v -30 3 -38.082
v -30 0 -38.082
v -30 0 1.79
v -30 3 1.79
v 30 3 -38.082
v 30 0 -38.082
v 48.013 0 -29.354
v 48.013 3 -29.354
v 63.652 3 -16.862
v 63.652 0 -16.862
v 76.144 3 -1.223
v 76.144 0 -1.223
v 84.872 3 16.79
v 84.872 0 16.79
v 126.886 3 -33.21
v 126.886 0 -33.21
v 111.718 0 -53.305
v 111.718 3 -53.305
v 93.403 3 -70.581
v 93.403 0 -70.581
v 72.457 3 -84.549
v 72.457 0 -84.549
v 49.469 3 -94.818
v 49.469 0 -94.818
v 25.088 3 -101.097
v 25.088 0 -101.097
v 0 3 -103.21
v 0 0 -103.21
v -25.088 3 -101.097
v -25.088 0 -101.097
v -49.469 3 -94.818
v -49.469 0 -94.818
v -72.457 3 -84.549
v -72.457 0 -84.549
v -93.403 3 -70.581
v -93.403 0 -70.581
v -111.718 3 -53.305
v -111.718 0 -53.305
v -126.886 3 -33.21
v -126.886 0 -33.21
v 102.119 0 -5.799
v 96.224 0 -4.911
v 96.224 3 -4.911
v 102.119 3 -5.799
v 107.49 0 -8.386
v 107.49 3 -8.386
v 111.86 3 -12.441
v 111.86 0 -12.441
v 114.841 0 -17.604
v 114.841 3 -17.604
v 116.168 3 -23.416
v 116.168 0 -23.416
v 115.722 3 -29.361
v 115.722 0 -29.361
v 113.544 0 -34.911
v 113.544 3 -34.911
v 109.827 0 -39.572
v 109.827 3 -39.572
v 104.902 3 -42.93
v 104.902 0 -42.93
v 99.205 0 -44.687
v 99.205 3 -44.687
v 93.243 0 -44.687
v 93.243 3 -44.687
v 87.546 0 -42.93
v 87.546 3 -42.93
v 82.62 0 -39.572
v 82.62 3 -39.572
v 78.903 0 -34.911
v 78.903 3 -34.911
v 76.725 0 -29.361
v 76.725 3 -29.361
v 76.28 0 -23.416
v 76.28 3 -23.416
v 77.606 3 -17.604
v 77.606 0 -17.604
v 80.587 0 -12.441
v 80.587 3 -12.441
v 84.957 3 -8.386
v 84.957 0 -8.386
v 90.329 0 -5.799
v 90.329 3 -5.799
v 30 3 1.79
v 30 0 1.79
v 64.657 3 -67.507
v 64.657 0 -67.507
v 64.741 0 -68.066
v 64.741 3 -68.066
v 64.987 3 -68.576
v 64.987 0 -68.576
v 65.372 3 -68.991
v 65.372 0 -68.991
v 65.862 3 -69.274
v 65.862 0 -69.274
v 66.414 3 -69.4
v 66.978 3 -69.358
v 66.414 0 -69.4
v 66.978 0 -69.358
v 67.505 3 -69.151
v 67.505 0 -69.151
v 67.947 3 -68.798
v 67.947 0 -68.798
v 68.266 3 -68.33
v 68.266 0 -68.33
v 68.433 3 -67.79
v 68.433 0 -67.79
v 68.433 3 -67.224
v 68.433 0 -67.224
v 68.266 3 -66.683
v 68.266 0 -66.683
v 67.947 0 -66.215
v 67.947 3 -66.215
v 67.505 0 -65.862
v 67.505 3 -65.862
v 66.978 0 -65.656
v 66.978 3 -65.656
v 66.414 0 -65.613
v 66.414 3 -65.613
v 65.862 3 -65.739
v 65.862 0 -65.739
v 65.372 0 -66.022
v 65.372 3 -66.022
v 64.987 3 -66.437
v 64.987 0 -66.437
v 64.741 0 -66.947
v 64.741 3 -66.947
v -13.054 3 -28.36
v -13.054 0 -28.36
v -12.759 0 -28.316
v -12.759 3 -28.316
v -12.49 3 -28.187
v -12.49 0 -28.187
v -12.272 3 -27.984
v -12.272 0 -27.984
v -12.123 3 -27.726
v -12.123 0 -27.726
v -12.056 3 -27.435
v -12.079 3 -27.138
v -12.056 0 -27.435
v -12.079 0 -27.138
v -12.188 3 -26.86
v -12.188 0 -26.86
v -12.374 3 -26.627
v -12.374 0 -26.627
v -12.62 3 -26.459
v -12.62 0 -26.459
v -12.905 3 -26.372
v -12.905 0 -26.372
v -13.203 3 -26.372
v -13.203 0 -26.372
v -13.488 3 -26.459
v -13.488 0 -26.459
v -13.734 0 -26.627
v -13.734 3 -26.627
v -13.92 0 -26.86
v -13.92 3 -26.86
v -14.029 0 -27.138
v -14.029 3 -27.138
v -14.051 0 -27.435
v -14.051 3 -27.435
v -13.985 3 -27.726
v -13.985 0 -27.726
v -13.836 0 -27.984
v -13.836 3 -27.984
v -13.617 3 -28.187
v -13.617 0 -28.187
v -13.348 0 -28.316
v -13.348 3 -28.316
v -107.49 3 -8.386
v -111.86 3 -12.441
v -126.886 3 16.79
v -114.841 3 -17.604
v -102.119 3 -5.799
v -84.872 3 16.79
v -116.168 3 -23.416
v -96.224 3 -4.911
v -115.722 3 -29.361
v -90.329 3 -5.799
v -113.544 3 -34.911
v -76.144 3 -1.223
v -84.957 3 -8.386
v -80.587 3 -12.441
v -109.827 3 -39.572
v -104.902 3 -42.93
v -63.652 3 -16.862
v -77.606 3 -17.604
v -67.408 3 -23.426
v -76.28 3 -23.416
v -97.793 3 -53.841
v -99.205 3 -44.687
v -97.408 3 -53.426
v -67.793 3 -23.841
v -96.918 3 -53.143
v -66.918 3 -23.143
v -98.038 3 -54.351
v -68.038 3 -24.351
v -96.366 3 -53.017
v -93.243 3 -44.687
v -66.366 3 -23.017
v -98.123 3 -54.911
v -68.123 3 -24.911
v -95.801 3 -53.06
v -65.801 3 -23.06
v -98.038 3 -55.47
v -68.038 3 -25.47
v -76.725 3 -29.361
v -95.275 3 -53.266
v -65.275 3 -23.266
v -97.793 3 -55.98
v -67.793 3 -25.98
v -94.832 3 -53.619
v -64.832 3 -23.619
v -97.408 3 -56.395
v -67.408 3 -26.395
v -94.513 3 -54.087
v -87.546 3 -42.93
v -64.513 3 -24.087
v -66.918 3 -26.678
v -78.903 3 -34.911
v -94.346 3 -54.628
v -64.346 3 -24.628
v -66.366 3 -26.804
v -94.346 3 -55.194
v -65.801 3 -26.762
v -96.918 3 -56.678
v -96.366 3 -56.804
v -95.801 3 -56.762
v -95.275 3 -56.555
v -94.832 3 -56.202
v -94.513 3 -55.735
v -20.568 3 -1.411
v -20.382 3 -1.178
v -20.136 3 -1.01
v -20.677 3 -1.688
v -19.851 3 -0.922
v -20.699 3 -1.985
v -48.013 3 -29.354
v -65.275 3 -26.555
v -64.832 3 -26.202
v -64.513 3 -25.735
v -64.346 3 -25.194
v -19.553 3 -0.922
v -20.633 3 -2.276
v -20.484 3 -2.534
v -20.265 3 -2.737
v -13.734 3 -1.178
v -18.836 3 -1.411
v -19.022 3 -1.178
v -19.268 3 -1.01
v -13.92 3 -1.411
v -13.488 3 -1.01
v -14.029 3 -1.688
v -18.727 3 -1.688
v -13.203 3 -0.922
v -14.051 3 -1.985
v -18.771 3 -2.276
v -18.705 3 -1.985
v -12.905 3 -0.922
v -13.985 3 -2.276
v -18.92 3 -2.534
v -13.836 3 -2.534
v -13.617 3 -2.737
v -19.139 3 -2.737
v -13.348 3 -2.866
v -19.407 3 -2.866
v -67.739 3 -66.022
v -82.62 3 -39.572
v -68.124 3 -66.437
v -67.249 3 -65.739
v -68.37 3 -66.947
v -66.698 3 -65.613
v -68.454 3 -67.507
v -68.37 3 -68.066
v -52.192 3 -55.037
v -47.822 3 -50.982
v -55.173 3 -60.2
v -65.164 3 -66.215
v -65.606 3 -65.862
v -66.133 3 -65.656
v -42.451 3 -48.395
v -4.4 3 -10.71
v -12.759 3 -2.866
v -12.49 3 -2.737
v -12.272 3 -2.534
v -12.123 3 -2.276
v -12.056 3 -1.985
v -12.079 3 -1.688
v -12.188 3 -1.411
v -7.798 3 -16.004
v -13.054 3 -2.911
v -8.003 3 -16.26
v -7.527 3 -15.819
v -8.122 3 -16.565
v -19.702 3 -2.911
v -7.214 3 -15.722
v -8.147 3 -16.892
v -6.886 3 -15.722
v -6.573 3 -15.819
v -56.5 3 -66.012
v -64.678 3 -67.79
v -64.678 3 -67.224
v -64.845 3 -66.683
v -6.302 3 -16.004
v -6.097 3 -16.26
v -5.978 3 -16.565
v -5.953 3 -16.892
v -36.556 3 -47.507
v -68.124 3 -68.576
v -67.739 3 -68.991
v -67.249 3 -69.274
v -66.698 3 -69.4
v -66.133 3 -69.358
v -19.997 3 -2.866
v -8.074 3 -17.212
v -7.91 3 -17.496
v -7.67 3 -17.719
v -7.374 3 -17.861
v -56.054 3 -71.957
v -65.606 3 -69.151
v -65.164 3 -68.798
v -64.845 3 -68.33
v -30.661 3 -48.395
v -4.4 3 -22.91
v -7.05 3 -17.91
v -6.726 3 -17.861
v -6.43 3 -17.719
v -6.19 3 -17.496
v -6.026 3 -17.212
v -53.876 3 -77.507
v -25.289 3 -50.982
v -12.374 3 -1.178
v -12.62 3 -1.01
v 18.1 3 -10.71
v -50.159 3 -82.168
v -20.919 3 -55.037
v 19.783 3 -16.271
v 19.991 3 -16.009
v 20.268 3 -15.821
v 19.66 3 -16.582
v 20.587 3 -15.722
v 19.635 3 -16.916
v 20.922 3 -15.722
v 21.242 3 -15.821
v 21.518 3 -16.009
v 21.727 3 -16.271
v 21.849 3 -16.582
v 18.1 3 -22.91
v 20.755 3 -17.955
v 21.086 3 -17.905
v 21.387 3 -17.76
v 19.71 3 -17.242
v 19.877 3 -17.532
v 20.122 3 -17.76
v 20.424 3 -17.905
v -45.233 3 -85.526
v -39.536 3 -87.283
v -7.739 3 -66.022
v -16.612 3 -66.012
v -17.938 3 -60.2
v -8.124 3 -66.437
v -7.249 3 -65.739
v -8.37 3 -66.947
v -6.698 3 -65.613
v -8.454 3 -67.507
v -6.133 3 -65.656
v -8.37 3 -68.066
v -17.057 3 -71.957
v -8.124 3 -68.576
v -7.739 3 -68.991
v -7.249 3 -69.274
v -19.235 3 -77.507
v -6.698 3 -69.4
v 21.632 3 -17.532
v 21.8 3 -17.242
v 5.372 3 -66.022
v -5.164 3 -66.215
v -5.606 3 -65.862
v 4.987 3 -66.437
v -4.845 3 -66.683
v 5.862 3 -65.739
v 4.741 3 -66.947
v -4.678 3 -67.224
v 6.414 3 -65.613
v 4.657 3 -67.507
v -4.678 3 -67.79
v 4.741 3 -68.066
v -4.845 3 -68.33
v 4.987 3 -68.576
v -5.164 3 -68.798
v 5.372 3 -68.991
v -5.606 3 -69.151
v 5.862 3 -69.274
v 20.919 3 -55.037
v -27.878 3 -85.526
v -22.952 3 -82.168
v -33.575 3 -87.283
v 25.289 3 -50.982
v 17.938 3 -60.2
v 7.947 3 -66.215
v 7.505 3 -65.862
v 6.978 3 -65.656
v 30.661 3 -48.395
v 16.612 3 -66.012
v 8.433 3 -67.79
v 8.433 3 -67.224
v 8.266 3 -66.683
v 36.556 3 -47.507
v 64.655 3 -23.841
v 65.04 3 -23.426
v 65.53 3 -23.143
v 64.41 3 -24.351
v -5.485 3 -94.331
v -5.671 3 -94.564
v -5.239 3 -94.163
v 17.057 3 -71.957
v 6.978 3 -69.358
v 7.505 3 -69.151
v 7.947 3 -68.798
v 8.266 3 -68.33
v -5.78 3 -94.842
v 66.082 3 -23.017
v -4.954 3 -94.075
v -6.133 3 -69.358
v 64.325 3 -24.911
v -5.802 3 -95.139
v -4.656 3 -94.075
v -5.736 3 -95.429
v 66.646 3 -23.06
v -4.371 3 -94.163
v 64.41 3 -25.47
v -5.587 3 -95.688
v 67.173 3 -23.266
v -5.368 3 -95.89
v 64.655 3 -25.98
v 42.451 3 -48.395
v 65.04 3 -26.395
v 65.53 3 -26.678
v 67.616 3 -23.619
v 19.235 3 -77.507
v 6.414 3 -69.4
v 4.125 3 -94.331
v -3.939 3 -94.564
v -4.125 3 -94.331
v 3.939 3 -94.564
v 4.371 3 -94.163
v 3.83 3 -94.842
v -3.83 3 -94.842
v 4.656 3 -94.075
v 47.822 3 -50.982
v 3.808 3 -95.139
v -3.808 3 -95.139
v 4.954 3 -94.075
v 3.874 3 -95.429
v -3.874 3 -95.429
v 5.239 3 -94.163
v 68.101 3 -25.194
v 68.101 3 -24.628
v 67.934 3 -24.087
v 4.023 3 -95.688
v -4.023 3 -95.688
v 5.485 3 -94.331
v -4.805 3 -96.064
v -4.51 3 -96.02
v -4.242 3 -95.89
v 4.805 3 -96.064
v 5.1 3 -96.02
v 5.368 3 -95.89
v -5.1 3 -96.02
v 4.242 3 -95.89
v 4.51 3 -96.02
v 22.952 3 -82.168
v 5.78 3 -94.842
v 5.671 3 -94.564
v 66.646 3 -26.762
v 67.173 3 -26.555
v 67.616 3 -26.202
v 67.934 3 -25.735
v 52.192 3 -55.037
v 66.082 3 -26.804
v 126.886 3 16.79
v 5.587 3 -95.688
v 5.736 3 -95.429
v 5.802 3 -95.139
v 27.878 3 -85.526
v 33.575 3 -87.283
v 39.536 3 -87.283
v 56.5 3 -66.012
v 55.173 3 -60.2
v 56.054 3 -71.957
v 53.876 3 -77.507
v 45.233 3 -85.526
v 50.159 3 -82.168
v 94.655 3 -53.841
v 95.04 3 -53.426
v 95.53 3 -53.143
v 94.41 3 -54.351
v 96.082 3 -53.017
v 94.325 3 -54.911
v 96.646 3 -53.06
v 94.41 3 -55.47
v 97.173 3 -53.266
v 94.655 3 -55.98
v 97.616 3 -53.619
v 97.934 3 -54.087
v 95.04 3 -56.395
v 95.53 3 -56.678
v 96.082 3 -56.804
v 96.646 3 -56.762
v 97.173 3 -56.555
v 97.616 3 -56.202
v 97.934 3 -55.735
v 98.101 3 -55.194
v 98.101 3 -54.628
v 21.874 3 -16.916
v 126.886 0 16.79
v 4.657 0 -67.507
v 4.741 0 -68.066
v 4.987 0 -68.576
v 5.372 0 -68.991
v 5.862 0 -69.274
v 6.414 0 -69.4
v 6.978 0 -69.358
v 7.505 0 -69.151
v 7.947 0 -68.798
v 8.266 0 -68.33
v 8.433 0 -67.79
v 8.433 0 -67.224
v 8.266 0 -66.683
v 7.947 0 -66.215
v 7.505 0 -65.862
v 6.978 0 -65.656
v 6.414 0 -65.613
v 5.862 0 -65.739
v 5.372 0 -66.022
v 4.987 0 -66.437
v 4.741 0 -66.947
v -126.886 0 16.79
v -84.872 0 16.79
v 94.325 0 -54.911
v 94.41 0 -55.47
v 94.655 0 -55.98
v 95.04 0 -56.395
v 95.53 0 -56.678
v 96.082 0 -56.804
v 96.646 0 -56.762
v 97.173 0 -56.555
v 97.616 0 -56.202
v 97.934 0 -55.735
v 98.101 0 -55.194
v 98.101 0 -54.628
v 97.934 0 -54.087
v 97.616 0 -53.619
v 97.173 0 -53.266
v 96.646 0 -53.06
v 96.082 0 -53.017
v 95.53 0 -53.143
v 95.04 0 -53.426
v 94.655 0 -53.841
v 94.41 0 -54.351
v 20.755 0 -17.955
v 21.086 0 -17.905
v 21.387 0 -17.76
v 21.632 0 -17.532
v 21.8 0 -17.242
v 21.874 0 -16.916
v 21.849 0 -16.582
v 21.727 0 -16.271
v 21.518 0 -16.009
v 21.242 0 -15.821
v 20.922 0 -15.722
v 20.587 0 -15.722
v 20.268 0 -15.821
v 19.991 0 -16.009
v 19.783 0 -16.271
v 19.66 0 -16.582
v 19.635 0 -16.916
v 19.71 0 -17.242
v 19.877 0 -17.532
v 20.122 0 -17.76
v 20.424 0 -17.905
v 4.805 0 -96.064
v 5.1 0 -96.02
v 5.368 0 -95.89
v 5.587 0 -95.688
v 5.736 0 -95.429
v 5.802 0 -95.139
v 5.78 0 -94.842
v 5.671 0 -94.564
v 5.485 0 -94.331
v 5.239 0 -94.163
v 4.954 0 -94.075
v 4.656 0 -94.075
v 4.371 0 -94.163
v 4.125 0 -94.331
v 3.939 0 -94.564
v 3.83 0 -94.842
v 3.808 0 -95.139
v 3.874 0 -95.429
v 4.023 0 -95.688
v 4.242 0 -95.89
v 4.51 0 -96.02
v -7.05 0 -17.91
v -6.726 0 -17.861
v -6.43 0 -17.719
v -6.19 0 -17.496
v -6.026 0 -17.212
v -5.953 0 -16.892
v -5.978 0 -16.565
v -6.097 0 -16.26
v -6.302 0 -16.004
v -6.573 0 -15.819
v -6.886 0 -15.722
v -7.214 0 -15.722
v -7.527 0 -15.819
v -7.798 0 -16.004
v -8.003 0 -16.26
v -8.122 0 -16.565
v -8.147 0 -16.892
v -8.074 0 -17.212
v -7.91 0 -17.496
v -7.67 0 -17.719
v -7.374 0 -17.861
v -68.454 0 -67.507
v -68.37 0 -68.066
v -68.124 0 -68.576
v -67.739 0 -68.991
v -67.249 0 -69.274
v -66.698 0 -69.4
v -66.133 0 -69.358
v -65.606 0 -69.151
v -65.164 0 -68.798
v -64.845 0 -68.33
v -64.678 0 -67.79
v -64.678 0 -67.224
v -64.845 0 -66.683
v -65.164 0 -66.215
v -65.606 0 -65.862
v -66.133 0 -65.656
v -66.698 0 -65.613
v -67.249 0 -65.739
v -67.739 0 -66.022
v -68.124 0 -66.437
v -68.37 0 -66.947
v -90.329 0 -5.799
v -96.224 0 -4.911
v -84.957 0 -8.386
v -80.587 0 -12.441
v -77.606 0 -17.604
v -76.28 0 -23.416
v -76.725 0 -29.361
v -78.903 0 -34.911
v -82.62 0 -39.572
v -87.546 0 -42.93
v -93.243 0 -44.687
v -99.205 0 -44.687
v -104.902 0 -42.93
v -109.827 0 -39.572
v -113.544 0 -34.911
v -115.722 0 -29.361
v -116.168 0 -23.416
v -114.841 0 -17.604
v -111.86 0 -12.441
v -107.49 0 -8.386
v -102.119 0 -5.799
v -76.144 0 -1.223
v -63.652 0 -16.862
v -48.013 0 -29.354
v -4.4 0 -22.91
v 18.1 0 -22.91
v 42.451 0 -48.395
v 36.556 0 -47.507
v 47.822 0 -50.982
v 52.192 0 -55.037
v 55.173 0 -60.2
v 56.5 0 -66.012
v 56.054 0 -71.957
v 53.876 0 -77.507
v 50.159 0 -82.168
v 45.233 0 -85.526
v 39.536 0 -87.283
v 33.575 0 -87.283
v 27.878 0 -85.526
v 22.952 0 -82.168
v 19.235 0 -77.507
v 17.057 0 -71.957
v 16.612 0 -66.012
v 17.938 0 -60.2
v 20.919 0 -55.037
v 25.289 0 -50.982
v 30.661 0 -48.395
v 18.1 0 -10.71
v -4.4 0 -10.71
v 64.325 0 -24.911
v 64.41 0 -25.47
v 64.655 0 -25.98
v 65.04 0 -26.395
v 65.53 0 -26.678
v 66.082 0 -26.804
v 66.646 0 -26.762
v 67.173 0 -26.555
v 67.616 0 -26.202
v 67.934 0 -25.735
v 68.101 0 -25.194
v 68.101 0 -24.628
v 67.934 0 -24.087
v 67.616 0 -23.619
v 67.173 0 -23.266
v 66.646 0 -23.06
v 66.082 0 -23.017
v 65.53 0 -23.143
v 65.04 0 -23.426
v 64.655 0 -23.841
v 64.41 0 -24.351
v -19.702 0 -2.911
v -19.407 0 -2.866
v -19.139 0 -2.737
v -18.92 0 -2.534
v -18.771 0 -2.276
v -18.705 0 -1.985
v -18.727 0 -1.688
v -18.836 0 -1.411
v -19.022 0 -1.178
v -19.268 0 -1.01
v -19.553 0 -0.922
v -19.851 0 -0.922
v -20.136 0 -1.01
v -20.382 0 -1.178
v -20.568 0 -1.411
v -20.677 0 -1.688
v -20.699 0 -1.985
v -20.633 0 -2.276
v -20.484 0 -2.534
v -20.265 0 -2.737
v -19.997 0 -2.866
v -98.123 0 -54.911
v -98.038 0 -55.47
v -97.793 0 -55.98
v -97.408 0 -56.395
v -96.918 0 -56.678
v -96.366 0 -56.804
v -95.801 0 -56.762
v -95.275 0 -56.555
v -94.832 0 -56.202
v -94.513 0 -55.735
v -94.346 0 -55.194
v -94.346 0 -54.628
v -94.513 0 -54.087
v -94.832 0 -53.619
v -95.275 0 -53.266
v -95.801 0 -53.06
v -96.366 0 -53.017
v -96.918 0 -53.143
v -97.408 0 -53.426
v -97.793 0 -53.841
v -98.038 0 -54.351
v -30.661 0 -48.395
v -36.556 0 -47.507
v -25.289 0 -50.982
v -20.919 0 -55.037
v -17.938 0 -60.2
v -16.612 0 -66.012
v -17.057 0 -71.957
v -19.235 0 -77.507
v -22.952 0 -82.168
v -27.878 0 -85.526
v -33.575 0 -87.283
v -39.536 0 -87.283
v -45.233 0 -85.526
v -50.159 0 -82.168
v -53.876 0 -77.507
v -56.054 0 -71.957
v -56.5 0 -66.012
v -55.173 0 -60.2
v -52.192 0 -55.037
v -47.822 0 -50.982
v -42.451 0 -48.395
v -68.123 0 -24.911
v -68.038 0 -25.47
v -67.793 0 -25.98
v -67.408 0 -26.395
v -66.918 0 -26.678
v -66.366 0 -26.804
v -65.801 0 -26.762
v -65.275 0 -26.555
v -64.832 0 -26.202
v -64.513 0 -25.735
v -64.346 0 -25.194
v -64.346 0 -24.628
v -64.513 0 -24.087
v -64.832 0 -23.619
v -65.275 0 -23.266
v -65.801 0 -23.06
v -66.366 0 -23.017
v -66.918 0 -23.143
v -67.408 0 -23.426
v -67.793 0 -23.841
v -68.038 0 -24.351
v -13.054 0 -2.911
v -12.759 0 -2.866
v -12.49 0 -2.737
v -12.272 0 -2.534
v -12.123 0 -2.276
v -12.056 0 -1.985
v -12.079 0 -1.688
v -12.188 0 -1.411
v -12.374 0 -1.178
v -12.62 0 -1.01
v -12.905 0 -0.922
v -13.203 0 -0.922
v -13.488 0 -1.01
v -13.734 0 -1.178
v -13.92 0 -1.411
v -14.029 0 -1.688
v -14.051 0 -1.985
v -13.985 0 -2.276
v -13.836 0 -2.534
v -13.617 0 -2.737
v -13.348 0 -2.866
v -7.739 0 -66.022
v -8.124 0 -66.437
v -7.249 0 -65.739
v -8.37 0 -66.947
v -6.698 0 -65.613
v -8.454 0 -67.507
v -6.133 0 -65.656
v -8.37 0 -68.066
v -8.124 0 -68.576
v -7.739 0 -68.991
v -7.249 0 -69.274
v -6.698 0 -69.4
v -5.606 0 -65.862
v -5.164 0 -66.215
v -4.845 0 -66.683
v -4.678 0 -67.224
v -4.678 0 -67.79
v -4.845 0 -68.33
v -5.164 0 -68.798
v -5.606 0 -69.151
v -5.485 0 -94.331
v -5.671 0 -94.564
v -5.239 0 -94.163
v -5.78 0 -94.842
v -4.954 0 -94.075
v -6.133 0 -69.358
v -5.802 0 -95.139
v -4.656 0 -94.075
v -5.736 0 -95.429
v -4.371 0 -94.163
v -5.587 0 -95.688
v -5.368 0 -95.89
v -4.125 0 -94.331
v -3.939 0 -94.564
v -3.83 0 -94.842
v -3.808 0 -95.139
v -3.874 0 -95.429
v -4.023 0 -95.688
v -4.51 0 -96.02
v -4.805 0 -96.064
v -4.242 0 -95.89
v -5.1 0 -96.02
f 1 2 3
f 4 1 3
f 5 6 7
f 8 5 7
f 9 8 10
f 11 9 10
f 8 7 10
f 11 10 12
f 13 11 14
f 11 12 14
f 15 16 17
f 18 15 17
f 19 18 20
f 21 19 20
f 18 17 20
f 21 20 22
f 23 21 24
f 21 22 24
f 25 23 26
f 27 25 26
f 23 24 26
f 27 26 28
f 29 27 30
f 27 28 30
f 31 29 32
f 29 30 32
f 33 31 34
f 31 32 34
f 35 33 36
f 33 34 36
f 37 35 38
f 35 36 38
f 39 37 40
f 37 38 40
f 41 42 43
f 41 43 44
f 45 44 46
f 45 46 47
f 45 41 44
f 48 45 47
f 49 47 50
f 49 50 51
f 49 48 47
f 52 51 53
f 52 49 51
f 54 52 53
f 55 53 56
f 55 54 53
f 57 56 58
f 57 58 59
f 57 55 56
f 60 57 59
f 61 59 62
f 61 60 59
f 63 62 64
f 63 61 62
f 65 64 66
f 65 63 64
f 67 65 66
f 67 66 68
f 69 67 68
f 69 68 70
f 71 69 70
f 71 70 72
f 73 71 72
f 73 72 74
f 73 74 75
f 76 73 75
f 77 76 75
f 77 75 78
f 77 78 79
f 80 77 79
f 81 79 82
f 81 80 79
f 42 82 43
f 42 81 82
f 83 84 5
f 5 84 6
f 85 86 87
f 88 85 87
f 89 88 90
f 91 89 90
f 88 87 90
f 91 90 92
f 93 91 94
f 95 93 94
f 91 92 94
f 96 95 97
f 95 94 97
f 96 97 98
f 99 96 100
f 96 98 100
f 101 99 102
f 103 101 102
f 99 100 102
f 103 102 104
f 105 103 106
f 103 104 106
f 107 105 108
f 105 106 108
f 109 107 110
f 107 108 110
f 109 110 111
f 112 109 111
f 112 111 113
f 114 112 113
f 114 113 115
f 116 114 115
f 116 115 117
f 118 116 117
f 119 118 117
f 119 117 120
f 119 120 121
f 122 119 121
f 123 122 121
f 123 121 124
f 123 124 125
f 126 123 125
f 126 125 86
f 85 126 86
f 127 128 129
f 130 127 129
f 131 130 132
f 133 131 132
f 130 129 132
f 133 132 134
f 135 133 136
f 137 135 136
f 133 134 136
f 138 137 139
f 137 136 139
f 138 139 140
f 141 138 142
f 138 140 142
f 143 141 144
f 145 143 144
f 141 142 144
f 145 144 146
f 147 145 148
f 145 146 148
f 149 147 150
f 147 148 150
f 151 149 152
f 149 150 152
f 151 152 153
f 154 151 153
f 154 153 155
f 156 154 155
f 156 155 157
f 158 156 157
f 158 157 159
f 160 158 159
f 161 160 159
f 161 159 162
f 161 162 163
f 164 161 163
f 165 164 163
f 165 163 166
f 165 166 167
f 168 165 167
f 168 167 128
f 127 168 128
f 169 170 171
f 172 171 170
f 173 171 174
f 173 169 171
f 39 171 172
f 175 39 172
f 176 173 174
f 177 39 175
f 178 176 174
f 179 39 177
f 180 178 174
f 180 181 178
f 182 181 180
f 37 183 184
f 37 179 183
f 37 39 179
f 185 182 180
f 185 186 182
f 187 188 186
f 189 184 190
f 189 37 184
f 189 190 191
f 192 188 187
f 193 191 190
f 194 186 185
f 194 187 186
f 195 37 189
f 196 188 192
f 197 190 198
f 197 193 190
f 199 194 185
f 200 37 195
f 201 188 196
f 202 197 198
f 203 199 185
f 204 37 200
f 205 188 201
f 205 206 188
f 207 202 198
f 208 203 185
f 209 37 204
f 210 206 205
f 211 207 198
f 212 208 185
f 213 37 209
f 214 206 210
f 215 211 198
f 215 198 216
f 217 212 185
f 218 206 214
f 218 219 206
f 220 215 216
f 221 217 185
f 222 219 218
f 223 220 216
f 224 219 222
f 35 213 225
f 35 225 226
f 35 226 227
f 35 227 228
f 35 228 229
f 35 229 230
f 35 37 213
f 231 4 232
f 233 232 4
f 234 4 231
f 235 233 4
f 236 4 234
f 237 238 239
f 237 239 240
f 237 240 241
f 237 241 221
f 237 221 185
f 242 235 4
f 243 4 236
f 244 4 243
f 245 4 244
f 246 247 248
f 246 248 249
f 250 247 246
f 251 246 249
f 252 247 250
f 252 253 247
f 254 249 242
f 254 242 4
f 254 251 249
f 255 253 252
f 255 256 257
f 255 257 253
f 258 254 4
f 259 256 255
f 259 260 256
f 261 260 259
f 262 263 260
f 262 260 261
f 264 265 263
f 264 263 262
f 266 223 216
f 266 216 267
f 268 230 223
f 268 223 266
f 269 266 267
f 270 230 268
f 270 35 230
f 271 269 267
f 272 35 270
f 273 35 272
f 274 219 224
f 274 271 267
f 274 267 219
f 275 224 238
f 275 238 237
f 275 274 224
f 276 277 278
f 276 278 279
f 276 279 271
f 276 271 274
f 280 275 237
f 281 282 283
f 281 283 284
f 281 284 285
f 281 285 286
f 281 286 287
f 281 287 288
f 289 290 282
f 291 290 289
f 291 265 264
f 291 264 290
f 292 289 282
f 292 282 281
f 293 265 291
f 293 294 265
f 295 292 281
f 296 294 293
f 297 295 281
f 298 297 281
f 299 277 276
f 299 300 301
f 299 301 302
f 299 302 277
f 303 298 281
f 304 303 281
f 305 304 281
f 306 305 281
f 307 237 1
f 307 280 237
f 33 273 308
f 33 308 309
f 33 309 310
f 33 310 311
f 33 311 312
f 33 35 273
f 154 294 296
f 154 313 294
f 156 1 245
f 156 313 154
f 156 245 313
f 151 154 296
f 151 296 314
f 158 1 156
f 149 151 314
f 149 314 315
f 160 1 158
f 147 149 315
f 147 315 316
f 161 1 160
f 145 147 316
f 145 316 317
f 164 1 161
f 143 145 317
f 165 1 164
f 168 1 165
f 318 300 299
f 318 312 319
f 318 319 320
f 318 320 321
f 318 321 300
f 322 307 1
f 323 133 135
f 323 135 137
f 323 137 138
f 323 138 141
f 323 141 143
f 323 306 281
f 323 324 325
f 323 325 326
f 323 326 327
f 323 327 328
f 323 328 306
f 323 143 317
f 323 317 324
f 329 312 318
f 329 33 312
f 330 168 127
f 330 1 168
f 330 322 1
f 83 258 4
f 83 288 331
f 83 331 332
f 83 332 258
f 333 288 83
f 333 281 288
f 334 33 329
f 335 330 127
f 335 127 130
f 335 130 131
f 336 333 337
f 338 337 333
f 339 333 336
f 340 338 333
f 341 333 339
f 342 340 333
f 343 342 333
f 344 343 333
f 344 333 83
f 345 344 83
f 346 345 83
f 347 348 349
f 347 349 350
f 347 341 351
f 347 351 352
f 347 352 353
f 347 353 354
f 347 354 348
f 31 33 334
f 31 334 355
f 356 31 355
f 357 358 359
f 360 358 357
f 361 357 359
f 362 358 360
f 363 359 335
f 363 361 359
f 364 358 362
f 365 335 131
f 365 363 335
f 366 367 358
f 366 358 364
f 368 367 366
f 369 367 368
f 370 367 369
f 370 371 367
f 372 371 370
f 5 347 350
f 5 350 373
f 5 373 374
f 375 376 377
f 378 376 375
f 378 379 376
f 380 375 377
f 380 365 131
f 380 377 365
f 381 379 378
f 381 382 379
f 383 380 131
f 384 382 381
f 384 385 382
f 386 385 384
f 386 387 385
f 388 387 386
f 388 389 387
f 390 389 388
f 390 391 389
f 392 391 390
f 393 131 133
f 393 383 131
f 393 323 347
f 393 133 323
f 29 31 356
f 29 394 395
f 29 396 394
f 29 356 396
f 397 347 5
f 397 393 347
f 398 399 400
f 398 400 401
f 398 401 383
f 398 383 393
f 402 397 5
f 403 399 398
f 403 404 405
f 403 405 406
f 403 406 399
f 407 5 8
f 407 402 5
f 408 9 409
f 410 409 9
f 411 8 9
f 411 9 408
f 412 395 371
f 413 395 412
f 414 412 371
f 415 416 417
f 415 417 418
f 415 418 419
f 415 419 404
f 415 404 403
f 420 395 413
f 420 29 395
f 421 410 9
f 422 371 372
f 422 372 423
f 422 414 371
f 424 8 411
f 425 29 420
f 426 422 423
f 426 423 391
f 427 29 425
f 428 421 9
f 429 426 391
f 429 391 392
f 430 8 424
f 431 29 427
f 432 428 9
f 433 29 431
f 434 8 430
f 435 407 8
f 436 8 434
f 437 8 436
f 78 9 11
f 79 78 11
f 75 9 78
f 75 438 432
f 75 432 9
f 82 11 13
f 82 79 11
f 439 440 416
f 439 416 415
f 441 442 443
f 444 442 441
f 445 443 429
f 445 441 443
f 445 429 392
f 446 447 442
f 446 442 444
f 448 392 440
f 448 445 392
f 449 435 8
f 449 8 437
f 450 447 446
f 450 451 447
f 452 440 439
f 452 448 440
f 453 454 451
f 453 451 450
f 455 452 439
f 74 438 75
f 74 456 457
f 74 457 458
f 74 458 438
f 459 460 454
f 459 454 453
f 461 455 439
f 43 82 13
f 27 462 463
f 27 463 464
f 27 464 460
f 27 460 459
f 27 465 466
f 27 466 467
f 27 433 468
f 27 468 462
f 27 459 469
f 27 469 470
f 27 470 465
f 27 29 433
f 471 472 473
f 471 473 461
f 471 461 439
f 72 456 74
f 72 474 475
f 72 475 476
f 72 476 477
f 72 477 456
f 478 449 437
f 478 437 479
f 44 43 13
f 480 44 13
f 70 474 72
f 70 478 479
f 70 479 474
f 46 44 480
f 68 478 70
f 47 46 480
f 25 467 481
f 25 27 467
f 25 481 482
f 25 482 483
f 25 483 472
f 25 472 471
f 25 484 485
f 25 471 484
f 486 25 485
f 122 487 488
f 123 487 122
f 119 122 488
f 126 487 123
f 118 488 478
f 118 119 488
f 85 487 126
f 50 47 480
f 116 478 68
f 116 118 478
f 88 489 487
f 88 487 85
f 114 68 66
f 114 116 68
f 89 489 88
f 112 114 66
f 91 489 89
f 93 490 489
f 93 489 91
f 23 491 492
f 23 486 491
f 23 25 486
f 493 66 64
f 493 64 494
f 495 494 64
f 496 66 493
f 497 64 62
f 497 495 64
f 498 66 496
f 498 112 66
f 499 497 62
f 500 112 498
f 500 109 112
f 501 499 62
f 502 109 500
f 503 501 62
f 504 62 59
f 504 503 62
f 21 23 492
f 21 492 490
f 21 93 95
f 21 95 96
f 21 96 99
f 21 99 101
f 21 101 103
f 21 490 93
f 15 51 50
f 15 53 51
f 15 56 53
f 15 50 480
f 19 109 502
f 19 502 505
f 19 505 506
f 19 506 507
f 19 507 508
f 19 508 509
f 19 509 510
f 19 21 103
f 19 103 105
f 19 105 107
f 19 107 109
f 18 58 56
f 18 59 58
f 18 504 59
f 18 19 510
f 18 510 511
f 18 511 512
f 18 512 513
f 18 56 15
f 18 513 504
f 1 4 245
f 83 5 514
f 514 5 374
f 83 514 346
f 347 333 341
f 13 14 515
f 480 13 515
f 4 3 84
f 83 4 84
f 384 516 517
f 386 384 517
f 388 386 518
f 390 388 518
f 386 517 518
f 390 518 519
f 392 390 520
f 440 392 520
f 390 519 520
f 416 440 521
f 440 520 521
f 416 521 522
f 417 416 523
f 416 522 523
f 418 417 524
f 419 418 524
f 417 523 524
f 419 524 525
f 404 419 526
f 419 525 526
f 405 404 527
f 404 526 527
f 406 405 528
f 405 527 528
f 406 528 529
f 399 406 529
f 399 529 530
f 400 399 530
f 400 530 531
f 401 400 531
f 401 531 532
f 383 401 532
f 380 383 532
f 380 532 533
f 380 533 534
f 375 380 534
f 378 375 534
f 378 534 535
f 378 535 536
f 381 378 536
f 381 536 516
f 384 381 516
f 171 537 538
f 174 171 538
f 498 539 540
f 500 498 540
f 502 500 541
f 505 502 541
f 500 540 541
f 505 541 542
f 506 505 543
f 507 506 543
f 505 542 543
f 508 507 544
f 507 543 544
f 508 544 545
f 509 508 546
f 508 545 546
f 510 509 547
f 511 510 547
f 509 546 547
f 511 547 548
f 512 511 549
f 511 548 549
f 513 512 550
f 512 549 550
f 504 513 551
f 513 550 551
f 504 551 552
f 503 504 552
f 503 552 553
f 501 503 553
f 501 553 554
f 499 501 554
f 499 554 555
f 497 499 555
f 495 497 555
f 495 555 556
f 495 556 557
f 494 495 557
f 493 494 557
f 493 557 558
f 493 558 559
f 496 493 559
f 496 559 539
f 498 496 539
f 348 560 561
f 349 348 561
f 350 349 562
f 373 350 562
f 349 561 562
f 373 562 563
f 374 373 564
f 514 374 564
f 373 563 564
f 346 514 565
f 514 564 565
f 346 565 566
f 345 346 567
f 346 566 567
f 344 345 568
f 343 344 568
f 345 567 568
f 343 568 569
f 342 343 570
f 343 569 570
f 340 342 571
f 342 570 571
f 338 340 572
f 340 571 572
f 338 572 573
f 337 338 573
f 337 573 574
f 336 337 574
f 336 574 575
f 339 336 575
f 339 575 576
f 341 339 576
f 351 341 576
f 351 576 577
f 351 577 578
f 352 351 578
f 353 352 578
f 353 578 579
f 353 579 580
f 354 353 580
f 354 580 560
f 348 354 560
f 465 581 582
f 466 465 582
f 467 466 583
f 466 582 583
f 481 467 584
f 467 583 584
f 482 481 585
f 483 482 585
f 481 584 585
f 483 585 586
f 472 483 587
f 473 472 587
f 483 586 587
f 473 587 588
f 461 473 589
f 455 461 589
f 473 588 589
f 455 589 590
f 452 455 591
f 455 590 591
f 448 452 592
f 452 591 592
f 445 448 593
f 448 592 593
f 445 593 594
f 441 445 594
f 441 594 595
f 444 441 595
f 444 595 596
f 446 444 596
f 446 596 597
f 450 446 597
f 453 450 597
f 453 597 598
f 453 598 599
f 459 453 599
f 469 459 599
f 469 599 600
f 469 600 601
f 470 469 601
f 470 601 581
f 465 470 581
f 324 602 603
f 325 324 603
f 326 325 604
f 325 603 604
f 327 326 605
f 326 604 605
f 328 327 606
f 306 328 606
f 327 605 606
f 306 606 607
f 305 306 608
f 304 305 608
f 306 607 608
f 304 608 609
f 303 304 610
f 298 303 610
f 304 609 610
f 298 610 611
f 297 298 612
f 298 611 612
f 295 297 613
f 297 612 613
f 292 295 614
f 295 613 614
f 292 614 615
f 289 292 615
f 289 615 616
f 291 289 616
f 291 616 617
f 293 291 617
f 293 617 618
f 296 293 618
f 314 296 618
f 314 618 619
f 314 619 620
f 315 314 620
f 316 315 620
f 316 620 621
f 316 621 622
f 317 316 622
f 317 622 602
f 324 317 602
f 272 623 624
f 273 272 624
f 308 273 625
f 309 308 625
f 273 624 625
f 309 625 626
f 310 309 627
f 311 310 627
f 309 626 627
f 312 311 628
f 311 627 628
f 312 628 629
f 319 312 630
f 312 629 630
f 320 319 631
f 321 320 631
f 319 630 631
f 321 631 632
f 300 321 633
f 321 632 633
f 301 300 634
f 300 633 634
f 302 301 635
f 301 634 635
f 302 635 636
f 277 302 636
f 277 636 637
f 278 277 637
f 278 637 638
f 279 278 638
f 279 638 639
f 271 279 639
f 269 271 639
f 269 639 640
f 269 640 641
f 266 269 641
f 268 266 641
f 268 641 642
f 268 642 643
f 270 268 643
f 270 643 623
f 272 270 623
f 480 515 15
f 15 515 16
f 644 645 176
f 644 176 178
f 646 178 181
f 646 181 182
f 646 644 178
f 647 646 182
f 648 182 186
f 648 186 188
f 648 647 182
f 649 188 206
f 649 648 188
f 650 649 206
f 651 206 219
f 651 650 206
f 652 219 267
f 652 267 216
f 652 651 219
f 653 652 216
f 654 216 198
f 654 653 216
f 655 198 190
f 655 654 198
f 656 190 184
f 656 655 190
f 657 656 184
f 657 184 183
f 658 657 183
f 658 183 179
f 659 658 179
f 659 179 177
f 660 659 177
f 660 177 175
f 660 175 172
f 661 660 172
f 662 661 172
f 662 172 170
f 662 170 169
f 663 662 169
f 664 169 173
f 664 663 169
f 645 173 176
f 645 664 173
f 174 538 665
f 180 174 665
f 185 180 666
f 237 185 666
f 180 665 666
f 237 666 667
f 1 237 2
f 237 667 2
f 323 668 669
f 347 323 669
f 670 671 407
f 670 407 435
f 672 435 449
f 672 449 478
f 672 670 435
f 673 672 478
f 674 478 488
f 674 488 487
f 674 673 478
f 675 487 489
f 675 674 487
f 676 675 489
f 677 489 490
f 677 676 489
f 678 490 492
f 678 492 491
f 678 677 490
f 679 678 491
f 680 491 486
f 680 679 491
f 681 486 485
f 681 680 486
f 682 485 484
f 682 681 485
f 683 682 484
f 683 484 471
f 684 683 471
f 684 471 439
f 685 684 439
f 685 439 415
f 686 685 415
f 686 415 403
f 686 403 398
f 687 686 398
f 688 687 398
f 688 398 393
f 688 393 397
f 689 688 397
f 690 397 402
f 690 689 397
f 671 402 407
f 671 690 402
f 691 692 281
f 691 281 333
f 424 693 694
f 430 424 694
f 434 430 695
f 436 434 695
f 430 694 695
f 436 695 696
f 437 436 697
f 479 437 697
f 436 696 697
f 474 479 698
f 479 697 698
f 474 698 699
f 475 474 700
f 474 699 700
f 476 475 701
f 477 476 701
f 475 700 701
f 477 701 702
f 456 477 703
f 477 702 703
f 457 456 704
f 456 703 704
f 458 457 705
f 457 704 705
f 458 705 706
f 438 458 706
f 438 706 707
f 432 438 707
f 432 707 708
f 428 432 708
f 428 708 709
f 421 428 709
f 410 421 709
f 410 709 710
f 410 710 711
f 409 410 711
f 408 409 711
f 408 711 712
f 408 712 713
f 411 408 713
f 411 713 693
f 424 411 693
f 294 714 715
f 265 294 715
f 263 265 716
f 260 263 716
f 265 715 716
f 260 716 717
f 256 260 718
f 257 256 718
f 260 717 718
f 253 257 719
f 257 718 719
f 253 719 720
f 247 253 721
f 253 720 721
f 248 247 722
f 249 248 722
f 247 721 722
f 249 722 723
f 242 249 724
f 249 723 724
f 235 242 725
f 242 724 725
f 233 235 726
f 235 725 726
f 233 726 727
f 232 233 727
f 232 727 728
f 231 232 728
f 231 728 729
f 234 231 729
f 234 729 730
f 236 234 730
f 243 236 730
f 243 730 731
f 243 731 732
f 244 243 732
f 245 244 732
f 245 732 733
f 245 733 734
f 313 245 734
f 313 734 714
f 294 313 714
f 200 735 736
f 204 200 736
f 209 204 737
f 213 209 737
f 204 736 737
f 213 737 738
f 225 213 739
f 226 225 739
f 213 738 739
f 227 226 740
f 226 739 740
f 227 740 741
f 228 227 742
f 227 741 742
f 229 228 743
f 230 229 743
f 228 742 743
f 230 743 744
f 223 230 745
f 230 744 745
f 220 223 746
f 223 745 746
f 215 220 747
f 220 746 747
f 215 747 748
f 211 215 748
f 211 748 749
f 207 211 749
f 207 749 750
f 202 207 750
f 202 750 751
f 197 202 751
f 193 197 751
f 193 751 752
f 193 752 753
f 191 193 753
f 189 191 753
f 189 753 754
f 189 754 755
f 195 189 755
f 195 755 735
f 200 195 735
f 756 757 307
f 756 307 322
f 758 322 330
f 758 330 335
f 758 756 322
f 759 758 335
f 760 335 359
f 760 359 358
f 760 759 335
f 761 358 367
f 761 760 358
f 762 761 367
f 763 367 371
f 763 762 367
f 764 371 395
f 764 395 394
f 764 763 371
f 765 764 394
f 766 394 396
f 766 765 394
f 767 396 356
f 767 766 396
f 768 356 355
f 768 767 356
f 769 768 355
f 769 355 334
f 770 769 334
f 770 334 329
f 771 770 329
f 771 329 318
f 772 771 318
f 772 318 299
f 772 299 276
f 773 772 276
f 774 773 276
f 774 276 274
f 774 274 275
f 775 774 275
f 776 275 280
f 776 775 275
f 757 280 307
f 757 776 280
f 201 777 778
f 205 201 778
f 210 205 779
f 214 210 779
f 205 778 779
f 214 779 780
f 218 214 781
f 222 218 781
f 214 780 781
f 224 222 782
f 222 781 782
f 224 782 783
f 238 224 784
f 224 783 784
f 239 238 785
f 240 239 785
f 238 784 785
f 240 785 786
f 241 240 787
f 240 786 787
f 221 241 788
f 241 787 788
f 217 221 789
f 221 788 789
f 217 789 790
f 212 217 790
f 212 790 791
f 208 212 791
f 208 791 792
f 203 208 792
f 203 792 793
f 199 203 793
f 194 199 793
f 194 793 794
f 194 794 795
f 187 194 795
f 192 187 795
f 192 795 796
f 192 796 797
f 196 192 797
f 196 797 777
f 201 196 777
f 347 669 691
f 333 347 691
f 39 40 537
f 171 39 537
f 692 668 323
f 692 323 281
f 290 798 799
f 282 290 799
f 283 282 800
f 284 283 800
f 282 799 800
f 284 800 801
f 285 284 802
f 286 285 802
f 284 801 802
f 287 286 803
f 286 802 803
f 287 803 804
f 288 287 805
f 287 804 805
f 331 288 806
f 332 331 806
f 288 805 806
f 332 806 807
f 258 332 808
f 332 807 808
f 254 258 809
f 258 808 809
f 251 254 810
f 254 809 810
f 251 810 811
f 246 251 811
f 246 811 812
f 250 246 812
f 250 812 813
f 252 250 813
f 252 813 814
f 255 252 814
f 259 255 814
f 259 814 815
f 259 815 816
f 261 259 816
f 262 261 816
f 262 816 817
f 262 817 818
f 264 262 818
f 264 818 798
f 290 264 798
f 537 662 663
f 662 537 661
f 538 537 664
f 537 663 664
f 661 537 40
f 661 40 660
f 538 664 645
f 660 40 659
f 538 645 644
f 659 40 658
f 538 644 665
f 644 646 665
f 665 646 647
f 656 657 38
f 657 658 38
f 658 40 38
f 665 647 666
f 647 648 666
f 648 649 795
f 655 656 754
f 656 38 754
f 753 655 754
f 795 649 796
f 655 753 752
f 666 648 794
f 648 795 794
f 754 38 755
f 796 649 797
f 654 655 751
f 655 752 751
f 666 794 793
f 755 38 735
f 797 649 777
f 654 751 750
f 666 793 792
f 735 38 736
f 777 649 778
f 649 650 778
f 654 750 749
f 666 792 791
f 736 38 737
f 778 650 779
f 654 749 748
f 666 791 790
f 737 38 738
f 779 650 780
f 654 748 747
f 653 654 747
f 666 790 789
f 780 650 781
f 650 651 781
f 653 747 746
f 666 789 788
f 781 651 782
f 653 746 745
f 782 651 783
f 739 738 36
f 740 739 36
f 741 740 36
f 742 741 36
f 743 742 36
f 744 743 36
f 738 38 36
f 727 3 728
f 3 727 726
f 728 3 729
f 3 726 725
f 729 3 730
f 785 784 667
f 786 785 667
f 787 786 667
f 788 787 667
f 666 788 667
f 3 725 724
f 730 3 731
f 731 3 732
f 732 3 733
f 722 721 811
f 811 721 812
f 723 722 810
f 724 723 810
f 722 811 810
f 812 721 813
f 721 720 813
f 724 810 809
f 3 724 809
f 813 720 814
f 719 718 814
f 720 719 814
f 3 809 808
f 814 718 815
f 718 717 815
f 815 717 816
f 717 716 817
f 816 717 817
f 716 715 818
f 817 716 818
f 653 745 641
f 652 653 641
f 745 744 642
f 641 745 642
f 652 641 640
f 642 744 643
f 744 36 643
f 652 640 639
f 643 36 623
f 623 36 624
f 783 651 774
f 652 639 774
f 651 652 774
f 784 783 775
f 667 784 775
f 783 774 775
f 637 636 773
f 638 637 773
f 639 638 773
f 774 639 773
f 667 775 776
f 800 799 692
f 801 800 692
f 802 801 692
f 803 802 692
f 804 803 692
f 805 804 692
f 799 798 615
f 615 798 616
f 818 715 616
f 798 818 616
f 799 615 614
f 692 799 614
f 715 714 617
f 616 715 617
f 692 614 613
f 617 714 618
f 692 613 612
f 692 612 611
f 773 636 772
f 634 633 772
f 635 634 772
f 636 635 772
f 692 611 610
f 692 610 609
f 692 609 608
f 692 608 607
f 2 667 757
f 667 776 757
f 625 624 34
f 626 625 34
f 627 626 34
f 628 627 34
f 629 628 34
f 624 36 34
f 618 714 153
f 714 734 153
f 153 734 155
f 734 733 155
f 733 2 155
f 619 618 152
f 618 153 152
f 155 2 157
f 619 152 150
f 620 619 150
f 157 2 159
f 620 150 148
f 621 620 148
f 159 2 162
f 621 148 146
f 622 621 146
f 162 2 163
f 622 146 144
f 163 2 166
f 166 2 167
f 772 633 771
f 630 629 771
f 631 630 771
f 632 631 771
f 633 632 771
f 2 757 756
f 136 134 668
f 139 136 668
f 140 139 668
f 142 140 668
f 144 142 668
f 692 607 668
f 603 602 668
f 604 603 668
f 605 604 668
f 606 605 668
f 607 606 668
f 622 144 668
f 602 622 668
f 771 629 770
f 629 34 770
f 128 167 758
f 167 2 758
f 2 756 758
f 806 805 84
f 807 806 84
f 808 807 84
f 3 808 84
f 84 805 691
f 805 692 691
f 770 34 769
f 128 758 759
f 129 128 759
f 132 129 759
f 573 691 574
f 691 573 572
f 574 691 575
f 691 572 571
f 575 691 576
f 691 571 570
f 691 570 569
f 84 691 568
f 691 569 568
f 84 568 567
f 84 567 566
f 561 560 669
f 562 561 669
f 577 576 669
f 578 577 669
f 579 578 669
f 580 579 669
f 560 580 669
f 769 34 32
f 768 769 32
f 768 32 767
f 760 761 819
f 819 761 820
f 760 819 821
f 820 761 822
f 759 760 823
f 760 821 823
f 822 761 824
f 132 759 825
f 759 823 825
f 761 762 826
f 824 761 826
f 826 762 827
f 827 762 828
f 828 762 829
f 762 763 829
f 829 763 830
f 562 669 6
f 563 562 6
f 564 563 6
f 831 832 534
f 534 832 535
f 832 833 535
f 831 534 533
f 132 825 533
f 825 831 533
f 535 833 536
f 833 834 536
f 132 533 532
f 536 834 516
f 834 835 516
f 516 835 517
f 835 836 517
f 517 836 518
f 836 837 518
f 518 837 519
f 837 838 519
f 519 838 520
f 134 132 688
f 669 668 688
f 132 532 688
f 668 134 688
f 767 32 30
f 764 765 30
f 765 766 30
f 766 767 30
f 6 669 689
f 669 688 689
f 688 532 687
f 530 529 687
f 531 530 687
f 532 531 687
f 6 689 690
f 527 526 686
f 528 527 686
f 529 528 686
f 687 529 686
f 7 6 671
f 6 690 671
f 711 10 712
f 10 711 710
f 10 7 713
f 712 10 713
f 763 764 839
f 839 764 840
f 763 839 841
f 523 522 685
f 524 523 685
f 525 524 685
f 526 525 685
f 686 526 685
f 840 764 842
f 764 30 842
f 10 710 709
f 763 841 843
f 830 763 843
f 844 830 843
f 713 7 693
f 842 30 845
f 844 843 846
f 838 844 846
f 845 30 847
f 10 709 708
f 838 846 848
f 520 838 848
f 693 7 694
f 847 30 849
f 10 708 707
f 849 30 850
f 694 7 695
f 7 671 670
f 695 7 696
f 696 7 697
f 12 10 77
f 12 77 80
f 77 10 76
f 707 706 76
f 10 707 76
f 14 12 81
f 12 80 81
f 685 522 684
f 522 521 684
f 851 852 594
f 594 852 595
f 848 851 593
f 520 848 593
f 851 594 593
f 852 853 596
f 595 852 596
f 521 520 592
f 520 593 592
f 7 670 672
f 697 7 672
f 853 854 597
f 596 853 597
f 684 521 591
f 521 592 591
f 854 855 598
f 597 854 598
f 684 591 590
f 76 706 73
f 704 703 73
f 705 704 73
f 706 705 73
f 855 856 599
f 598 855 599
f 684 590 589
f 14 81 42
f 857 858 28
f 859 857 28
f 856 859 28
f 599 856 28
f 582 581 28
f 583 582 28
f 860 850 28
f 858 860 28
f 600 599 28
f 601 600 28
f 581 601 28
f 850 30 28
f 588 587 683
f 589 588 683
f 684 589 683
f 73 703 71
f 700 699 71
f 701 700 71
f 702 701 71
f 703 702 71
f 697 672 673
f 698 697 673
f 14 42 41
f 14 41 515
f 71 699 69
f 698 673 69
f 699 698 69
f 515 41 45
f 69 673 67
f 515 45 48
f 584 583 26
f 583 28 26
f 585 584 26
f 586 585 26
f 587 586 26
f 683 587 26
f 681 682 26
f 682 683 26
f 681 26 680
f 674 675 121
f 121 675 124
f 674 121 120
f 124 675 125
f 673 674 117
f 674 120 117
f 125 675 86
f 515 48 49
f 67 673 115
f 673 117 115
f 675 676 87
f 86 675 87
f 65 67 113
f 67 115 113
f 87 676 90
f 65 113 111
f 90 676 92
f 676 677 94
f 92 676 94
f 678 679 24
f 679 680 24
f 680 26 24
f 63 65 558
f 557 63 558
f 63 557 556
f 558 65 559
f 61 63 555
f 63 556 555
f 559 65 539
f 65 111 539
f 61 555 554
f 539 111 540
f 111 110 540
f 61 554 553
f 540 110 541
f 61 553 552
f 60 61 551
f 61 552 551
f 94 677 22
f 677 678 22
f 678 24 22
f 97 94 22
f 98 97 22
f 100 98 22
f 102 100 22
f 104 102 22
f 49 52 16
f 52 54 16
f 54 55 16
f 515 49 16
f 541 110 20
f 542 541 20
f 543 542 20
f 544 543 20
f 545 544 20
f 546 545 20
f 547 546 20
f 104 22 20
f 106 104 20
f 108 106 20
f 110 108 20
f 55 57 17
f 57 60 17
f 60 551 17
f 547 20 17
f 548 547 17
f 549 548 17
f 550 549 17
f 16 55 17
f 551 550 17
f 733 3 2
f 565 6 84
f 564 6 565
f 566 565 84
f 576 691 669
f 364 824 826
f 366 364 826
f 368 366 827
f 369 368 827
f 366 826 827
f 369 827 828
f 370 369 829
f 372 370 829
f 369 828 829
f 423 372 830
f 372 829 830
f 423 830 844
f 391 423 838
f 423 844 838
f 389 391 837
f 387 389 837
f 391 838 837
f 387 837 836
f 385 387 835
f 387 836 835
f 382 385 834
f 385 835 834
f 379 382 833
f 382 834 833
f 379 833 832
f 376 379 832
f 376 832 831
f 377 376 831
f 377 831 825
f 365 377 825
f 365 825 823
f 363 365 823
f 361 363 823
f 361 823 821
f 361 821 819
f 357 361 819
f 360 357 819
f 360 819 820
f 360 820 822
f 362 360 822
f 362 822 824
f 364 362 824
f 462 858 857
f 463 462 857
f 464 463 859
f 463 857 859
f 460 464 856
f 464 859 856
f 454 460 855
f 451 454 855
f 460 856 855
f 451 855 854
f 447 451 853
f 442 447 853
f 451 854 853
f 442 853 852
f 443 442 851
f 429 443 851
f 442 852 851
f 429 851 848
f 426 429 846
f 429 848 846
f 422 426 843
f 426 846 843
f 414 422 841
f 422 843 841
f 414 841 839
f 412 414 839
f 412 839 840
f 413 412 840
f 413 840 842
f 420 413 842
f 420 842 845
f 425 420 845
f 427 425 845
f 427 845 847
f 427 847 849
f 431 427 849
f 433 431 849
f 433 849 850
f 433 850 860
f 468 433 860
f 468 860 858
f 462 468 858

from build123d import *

# Parameters (mm, degrees)
SKETCH3_R              = 20
BOSS_EXTRUDE3_DEPTH    = 3
F_10_24_TAPPED_HOLE1_D = 3.7973
SKETCH6_W              = 22.5
SKETCH6_H              = 12.2
CUT_EXTRUDE1_DEPTH     = 3
SKETCH7_R              = 1
SKETCH7_R_2            = 1.1
SKETCH7_R_3            = 1.122553576
CUT_EXTRUDE2_DEPTH     = 164.588932015


with BuildPart() as part:
    # Sketch3 → Boss-Extrude3 (new body)
    with BuildSketch(Plane(origin=(0, 0, 0), x_dir=(1, 0, 0), z_dir=(0, 1, 0))):
        with BuildLine():
            Line((-126.885775404, 33.210167511), (-126.885775404, -16.789832489))
            Line((-126.885775404, -16.789832489), (-84.87168845, -16.789832489))
            ThreePointArc((-84.87168845, -16.789832489), (-63.652193601, 16.862361112), (-30, 38.081855961))
            Line((-30, 38.081855961), (-30, -1.789832489))
            Line((-30, -1.789832489), (30, -1.789832489))
            Line((30, -1.789832489), (30, 38.081855961))
            ThreePointArc((30, 38.081855961), (63.652193601, 16.862361112), (84.87168845, -16.789832489))
            Line((84.87168845, -16.789832489), (126.885775404, -16.789832489))
            Line((126.885775404, -16.789832489), (126.885775404, 33.210167511))
            ThreePointArc((126.885775404, 33.210167511), (0, 103.210167511), (-126.885775404, 33.210167511))
        make_face()
        with Locations(Location((-96.223855306, 24.910723088, 0), (0, 0, 270))):
            Circle(SKETCH3_R, mode=Mode.SUBTRACT)
        with Locations(Location((96.223855306, 24.910723088, 0), (0, 0, 270))):
            Circle(SKETCH3_R, mode=Mode.SUBTRACT)
        with Locations(Location((-36.555626875, 67.506651026, 0), (0, 0, 270))):
            Circle(SKETCH3_R, mode=Mode.SUBTRACT)
        with Locations(Location((36.555626875, 67.506651026, 0), (0, 0, 270))):
            Circle(SKETCH3_R, mode=Mode.SUBTRACT)
    extrude(amount=BOSS_EXTRUDE3_DEPTH)

    # #10-24 Tapped Hole1 (through all)
    with Locations(Plane(origin=(0, 3, 0), x_dir=(1, 0, 0), z_dir=(0, 1, 0))):
        with Locations((-66.223855306, 24.910723088), (-96.223855306, 54.910723088), (-66.555626875, 67.506651026), (-6.555626875, 67.506651026), (6.555626875, 67.506651026), (66.555626875, 67.506651026), (96.223855306, 54.910723088), (66.223855306, 24.910723088)):
            Hole(F_10_24_TAPPED_HOLE1_D / 2)

    # Sketch6 → Cut-Extrude1 (cut)
    with BuildSketch(Plane.XZ):
        with Locations((6.85, -16.810167511)):
            Rectangle(SKETCH6_W, SKETCH6_H)
    extrude(amount=-CUT_EXTRUDE1_DEPTH, mode=Mode.SUBTRACT)

    # Sketch7 → Cut-Extrude2 (cut, through all)
    with BuildSketch(Plane.XZ):
        with Locations(Location((-13.053692885, -1.910723088, 0), (0, 0, 270))):
            Circle(SKETCH7_R)
        with Locations(Location((-19.702079803, -1.910723088, 0), (0, 0, 270))):
            Circle(SKETCH7_R)
        with Locations(Location((-13.053692885, -27.360397158, 0), (0, 0, 270))):
            Circle(SKETCH7_R)
        with Locations(Location((-4.804956753, -95.064096736, 0), (0, 0, 270))):
            Circle(SKETCH7_R)
        with Locations(Location((4.804956753, -95.064096736, 0), (0, 0, 270))):
            Circle(SKETCH7_R)
        with Locations(Location((-7.05, -16.810167511, 0), (0, 0, 270))):
            Circle(SKETCH7_R_2)
        with Locations(Location((20.754736903, -16.832218034, 0), (0, 0, 270))):
            Circle(SKETCH7_R_3)
    extrude(amount=-CUT_EXTRUDE2_DEPTH, mode=Mode.SUBTRACT)


solid = part.part
